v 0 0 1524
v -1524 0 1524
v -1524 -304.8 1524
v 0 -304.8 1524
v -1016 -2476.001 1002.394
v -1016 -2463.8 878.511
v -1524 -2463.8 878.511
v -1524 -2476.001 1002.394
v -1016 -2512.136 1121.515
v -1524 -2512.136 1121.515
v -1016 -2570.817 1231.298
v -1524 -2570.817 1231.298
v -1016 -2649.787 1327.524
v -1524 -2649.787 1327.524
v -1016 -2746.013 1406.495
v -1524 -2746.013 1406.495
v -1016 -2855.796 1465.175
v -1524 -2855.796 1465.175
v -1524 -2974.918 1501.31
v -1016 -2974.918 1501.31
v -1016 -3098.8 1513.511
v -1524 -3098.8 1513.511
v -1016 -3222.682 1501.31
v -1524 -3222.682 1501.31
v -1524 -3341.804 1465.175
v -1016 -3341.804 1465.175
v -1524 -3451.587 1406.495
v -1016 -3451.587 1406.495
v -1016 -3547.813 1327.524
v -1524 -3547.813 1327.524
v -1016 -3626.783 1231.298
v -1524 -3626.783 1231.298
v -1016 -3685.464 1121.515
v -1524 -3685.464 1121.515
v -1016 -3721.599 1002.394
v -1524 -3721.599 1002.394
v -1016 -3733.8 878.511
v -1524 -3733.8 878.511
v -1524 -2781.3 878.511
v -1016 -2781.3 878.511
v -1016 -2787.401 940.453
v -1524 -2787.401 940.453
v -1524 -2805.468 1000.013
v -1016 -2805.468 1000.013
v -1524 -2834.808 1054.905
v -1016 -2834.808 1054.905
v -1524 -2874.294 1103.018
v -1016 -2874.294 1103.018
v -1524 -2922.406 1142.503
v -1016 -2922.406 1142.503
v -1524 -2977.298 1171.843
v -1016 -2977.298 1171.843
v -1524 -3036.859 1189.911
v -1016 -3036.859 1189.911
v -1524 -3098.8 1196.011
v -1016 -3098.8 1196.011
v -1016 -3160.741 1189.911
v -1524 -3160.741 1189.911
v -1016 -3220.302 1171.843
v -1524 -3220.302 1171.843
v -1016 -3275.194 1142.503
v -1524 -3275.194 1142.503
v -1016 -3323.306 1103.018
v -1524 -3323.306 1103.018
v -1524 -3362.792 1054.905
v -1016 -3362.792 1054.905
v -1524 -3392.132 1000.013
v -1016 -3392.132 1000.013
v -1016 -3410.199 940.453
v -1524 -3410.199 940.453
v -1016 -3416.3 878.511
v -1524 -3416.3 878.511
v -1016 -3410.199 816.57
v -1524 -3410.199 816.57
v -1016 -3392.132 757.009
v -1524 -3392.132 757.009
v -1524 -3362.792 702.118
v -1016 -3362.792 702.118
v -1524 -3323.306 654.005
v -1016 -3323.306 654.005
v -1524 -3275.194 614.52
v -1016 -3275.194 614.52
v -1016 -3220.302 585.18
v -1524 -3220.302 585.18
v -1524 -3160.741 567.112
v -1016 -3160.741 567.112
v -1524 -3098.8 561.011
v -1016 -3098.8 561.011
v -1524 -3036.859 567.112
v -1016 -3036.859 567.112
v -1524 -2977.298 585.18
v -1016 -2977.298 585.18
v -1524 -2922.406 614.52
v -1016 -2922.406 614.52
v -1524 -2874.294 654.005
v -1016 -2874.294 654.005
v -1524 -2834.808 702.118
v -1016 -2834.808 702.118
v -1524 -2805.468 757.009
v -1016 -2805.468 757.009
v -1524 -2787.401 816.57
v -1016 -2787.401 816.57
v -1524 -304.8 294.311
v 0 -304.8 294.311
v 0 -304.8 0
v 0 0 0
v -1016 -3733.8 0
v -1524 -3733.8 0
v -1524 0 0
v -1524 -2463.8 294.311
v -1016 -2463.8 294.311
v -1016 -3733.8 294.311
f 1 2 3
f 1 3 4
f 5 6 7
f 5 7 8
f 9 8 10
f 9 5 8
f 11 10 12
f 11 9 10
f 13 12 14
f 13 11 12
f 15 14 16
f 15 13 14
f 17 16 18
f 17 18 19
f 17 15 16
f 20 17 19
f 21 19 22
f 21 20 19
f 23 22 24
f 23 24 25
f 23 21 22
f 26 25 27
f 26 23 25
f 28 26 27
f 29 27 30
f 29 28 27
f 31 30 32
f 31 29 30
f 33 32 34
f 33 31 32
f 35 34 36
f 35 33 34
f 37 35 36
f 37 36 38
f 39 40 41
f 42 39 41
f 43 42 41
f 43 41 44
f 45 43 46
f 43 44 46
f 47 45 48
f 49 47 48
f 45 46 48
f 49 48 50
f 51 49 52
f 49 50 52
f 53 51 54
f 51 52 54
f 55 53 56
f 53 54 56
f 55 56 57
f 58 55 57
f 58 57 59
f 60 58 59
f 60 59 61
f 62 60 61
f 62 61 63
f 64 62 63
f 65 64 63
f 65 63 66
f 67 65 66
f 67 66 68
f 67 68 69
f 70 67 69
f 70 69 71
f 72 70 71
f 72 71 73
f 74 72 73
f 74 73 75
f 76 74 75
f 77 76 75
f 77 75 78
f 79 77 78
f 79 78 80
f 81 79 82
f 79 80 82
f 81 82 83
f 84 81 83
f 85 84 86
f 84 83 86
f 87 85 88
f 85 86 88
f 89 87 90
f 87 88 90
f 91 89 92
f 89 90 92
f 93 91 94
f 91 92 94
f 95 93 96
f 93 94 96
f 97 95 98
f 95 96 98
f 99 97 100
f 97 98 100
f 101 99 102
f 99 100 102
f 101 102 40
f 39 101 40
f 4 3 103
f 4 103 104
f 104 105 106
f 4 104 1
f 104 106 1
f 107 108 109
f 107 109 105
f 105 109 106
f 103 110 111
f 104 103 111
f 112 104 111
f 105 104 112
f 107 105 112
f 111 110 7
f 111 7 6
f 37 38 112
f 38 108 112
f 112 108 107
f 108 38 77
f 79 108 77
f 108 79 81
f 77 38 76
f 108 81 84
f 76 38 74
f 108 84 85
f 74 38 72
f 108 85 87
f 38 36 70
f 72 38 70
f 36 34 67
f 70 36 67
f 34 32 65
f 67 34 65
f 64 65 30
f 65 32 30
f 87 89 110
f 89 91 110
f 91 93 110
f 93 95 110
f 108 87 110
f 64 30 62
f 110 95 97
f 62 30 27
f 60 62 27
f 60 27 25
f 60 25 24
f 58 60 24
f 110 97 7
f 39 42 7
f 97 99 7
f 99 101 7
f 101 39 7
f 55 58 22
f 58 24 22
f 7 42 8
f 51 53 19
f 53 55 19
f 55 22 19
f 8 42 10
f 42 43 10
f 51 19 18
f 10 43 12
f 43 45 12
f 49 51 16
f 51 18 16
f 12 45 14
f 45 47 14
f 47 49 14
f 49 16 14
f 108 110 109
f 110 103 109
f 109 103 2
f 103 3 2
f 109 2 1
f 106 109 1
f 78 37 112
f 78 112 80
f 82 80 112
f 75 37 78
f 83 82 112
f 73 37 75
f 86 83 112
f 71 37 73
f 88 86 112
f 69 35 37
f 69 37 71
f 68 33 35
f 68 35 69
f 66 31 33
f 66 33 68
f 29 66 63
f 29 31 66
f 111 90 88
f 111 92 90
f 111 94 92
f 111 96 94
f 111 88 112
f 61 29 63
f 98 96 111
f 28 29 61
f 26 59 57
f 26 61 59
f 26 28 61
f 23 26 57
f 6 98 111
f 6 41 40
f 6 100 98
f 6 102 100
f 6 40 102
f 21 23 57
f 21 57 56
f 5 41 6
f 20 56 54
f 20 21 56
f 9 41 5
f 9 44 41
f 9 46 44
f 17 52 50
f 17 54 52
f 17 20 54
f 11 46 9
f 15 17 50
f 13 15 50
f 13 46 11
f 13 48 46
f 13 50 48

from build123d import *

# Parameters (mm, degrees)
F0_W      = 1524
F0_H      = 1524
F1_DEPTH  = 304.8
F2_W      = 1524
F2_H      = 294.3113446236
F3_DEPTH  = 3429
F6_DEPTH  = 84658.2
F4_W      = 508
F4_H      = 1270
F7_DEPTH  = 584.2
F9_DEPTH  = 508
F10_R     = 317.5
F11_DEPTH = 1270


with BuildPart() as f1:
    # F0 (on Front) → F1 (new body)
    with BuildSketch(Plane.XZ):
        with Locations((-762, 762)):
            Rectangle(F0_W, F0_H)
    extrude(amount=F1_DEPTH)

    # F2 (on face) → F3 (join)
    with BuildSketch(Plane.XZ.offset(304.8)):
        with Locations((-762, 147.1556723118)):
            Rectangle(F2_W, F2_H)
    extrude(amount=F3_DEPTH)

    # F5 (on face) → F6 (cut)
    with BuildSketch(Plane.XY.offset(294.3113446236)):
        Polygon((0, -304.8), (-1016, -3733.8), (0, -3733.8), align=None)
    extrude(amount=-F6_DEPTH, mode=Mode.SUBTRACT)

    # F4 (on face) → F7 (join)
    with BuildSketch(Plane.XY.offset(294.3113446236)):
        with Locations((-1270, -3098.8)):
            Rectangle(F4_W, F4_H)
    extrude(amount=F7_DEPTH)

    # F8 (on face) → F9 (join)
    with BuildSketch(Plane.YZ.offset(-1016)):
        with BuildLine():
            Line((-3733.8, 878.5113446236), (-2463.8, 878.5113446236))
            ThreePointArc((-2463.8, 878.5113446236), (-3098.8, 1513.5113446236), (-3733.8, 878.5113446236))
        make_face()
    extrude(amount=-F9_DEPTH)

    # F10 (on face) → F11 (cut)
    with BuildSketch(Plane.YZ.offset(-1016)):
        with Locations((-3098.8, 878.5113446236)):
            Circle(F10_R)
    extrude(amount=-F11_DEPTH, mode=Mode.SUBTRACT)


solid = f1.part
